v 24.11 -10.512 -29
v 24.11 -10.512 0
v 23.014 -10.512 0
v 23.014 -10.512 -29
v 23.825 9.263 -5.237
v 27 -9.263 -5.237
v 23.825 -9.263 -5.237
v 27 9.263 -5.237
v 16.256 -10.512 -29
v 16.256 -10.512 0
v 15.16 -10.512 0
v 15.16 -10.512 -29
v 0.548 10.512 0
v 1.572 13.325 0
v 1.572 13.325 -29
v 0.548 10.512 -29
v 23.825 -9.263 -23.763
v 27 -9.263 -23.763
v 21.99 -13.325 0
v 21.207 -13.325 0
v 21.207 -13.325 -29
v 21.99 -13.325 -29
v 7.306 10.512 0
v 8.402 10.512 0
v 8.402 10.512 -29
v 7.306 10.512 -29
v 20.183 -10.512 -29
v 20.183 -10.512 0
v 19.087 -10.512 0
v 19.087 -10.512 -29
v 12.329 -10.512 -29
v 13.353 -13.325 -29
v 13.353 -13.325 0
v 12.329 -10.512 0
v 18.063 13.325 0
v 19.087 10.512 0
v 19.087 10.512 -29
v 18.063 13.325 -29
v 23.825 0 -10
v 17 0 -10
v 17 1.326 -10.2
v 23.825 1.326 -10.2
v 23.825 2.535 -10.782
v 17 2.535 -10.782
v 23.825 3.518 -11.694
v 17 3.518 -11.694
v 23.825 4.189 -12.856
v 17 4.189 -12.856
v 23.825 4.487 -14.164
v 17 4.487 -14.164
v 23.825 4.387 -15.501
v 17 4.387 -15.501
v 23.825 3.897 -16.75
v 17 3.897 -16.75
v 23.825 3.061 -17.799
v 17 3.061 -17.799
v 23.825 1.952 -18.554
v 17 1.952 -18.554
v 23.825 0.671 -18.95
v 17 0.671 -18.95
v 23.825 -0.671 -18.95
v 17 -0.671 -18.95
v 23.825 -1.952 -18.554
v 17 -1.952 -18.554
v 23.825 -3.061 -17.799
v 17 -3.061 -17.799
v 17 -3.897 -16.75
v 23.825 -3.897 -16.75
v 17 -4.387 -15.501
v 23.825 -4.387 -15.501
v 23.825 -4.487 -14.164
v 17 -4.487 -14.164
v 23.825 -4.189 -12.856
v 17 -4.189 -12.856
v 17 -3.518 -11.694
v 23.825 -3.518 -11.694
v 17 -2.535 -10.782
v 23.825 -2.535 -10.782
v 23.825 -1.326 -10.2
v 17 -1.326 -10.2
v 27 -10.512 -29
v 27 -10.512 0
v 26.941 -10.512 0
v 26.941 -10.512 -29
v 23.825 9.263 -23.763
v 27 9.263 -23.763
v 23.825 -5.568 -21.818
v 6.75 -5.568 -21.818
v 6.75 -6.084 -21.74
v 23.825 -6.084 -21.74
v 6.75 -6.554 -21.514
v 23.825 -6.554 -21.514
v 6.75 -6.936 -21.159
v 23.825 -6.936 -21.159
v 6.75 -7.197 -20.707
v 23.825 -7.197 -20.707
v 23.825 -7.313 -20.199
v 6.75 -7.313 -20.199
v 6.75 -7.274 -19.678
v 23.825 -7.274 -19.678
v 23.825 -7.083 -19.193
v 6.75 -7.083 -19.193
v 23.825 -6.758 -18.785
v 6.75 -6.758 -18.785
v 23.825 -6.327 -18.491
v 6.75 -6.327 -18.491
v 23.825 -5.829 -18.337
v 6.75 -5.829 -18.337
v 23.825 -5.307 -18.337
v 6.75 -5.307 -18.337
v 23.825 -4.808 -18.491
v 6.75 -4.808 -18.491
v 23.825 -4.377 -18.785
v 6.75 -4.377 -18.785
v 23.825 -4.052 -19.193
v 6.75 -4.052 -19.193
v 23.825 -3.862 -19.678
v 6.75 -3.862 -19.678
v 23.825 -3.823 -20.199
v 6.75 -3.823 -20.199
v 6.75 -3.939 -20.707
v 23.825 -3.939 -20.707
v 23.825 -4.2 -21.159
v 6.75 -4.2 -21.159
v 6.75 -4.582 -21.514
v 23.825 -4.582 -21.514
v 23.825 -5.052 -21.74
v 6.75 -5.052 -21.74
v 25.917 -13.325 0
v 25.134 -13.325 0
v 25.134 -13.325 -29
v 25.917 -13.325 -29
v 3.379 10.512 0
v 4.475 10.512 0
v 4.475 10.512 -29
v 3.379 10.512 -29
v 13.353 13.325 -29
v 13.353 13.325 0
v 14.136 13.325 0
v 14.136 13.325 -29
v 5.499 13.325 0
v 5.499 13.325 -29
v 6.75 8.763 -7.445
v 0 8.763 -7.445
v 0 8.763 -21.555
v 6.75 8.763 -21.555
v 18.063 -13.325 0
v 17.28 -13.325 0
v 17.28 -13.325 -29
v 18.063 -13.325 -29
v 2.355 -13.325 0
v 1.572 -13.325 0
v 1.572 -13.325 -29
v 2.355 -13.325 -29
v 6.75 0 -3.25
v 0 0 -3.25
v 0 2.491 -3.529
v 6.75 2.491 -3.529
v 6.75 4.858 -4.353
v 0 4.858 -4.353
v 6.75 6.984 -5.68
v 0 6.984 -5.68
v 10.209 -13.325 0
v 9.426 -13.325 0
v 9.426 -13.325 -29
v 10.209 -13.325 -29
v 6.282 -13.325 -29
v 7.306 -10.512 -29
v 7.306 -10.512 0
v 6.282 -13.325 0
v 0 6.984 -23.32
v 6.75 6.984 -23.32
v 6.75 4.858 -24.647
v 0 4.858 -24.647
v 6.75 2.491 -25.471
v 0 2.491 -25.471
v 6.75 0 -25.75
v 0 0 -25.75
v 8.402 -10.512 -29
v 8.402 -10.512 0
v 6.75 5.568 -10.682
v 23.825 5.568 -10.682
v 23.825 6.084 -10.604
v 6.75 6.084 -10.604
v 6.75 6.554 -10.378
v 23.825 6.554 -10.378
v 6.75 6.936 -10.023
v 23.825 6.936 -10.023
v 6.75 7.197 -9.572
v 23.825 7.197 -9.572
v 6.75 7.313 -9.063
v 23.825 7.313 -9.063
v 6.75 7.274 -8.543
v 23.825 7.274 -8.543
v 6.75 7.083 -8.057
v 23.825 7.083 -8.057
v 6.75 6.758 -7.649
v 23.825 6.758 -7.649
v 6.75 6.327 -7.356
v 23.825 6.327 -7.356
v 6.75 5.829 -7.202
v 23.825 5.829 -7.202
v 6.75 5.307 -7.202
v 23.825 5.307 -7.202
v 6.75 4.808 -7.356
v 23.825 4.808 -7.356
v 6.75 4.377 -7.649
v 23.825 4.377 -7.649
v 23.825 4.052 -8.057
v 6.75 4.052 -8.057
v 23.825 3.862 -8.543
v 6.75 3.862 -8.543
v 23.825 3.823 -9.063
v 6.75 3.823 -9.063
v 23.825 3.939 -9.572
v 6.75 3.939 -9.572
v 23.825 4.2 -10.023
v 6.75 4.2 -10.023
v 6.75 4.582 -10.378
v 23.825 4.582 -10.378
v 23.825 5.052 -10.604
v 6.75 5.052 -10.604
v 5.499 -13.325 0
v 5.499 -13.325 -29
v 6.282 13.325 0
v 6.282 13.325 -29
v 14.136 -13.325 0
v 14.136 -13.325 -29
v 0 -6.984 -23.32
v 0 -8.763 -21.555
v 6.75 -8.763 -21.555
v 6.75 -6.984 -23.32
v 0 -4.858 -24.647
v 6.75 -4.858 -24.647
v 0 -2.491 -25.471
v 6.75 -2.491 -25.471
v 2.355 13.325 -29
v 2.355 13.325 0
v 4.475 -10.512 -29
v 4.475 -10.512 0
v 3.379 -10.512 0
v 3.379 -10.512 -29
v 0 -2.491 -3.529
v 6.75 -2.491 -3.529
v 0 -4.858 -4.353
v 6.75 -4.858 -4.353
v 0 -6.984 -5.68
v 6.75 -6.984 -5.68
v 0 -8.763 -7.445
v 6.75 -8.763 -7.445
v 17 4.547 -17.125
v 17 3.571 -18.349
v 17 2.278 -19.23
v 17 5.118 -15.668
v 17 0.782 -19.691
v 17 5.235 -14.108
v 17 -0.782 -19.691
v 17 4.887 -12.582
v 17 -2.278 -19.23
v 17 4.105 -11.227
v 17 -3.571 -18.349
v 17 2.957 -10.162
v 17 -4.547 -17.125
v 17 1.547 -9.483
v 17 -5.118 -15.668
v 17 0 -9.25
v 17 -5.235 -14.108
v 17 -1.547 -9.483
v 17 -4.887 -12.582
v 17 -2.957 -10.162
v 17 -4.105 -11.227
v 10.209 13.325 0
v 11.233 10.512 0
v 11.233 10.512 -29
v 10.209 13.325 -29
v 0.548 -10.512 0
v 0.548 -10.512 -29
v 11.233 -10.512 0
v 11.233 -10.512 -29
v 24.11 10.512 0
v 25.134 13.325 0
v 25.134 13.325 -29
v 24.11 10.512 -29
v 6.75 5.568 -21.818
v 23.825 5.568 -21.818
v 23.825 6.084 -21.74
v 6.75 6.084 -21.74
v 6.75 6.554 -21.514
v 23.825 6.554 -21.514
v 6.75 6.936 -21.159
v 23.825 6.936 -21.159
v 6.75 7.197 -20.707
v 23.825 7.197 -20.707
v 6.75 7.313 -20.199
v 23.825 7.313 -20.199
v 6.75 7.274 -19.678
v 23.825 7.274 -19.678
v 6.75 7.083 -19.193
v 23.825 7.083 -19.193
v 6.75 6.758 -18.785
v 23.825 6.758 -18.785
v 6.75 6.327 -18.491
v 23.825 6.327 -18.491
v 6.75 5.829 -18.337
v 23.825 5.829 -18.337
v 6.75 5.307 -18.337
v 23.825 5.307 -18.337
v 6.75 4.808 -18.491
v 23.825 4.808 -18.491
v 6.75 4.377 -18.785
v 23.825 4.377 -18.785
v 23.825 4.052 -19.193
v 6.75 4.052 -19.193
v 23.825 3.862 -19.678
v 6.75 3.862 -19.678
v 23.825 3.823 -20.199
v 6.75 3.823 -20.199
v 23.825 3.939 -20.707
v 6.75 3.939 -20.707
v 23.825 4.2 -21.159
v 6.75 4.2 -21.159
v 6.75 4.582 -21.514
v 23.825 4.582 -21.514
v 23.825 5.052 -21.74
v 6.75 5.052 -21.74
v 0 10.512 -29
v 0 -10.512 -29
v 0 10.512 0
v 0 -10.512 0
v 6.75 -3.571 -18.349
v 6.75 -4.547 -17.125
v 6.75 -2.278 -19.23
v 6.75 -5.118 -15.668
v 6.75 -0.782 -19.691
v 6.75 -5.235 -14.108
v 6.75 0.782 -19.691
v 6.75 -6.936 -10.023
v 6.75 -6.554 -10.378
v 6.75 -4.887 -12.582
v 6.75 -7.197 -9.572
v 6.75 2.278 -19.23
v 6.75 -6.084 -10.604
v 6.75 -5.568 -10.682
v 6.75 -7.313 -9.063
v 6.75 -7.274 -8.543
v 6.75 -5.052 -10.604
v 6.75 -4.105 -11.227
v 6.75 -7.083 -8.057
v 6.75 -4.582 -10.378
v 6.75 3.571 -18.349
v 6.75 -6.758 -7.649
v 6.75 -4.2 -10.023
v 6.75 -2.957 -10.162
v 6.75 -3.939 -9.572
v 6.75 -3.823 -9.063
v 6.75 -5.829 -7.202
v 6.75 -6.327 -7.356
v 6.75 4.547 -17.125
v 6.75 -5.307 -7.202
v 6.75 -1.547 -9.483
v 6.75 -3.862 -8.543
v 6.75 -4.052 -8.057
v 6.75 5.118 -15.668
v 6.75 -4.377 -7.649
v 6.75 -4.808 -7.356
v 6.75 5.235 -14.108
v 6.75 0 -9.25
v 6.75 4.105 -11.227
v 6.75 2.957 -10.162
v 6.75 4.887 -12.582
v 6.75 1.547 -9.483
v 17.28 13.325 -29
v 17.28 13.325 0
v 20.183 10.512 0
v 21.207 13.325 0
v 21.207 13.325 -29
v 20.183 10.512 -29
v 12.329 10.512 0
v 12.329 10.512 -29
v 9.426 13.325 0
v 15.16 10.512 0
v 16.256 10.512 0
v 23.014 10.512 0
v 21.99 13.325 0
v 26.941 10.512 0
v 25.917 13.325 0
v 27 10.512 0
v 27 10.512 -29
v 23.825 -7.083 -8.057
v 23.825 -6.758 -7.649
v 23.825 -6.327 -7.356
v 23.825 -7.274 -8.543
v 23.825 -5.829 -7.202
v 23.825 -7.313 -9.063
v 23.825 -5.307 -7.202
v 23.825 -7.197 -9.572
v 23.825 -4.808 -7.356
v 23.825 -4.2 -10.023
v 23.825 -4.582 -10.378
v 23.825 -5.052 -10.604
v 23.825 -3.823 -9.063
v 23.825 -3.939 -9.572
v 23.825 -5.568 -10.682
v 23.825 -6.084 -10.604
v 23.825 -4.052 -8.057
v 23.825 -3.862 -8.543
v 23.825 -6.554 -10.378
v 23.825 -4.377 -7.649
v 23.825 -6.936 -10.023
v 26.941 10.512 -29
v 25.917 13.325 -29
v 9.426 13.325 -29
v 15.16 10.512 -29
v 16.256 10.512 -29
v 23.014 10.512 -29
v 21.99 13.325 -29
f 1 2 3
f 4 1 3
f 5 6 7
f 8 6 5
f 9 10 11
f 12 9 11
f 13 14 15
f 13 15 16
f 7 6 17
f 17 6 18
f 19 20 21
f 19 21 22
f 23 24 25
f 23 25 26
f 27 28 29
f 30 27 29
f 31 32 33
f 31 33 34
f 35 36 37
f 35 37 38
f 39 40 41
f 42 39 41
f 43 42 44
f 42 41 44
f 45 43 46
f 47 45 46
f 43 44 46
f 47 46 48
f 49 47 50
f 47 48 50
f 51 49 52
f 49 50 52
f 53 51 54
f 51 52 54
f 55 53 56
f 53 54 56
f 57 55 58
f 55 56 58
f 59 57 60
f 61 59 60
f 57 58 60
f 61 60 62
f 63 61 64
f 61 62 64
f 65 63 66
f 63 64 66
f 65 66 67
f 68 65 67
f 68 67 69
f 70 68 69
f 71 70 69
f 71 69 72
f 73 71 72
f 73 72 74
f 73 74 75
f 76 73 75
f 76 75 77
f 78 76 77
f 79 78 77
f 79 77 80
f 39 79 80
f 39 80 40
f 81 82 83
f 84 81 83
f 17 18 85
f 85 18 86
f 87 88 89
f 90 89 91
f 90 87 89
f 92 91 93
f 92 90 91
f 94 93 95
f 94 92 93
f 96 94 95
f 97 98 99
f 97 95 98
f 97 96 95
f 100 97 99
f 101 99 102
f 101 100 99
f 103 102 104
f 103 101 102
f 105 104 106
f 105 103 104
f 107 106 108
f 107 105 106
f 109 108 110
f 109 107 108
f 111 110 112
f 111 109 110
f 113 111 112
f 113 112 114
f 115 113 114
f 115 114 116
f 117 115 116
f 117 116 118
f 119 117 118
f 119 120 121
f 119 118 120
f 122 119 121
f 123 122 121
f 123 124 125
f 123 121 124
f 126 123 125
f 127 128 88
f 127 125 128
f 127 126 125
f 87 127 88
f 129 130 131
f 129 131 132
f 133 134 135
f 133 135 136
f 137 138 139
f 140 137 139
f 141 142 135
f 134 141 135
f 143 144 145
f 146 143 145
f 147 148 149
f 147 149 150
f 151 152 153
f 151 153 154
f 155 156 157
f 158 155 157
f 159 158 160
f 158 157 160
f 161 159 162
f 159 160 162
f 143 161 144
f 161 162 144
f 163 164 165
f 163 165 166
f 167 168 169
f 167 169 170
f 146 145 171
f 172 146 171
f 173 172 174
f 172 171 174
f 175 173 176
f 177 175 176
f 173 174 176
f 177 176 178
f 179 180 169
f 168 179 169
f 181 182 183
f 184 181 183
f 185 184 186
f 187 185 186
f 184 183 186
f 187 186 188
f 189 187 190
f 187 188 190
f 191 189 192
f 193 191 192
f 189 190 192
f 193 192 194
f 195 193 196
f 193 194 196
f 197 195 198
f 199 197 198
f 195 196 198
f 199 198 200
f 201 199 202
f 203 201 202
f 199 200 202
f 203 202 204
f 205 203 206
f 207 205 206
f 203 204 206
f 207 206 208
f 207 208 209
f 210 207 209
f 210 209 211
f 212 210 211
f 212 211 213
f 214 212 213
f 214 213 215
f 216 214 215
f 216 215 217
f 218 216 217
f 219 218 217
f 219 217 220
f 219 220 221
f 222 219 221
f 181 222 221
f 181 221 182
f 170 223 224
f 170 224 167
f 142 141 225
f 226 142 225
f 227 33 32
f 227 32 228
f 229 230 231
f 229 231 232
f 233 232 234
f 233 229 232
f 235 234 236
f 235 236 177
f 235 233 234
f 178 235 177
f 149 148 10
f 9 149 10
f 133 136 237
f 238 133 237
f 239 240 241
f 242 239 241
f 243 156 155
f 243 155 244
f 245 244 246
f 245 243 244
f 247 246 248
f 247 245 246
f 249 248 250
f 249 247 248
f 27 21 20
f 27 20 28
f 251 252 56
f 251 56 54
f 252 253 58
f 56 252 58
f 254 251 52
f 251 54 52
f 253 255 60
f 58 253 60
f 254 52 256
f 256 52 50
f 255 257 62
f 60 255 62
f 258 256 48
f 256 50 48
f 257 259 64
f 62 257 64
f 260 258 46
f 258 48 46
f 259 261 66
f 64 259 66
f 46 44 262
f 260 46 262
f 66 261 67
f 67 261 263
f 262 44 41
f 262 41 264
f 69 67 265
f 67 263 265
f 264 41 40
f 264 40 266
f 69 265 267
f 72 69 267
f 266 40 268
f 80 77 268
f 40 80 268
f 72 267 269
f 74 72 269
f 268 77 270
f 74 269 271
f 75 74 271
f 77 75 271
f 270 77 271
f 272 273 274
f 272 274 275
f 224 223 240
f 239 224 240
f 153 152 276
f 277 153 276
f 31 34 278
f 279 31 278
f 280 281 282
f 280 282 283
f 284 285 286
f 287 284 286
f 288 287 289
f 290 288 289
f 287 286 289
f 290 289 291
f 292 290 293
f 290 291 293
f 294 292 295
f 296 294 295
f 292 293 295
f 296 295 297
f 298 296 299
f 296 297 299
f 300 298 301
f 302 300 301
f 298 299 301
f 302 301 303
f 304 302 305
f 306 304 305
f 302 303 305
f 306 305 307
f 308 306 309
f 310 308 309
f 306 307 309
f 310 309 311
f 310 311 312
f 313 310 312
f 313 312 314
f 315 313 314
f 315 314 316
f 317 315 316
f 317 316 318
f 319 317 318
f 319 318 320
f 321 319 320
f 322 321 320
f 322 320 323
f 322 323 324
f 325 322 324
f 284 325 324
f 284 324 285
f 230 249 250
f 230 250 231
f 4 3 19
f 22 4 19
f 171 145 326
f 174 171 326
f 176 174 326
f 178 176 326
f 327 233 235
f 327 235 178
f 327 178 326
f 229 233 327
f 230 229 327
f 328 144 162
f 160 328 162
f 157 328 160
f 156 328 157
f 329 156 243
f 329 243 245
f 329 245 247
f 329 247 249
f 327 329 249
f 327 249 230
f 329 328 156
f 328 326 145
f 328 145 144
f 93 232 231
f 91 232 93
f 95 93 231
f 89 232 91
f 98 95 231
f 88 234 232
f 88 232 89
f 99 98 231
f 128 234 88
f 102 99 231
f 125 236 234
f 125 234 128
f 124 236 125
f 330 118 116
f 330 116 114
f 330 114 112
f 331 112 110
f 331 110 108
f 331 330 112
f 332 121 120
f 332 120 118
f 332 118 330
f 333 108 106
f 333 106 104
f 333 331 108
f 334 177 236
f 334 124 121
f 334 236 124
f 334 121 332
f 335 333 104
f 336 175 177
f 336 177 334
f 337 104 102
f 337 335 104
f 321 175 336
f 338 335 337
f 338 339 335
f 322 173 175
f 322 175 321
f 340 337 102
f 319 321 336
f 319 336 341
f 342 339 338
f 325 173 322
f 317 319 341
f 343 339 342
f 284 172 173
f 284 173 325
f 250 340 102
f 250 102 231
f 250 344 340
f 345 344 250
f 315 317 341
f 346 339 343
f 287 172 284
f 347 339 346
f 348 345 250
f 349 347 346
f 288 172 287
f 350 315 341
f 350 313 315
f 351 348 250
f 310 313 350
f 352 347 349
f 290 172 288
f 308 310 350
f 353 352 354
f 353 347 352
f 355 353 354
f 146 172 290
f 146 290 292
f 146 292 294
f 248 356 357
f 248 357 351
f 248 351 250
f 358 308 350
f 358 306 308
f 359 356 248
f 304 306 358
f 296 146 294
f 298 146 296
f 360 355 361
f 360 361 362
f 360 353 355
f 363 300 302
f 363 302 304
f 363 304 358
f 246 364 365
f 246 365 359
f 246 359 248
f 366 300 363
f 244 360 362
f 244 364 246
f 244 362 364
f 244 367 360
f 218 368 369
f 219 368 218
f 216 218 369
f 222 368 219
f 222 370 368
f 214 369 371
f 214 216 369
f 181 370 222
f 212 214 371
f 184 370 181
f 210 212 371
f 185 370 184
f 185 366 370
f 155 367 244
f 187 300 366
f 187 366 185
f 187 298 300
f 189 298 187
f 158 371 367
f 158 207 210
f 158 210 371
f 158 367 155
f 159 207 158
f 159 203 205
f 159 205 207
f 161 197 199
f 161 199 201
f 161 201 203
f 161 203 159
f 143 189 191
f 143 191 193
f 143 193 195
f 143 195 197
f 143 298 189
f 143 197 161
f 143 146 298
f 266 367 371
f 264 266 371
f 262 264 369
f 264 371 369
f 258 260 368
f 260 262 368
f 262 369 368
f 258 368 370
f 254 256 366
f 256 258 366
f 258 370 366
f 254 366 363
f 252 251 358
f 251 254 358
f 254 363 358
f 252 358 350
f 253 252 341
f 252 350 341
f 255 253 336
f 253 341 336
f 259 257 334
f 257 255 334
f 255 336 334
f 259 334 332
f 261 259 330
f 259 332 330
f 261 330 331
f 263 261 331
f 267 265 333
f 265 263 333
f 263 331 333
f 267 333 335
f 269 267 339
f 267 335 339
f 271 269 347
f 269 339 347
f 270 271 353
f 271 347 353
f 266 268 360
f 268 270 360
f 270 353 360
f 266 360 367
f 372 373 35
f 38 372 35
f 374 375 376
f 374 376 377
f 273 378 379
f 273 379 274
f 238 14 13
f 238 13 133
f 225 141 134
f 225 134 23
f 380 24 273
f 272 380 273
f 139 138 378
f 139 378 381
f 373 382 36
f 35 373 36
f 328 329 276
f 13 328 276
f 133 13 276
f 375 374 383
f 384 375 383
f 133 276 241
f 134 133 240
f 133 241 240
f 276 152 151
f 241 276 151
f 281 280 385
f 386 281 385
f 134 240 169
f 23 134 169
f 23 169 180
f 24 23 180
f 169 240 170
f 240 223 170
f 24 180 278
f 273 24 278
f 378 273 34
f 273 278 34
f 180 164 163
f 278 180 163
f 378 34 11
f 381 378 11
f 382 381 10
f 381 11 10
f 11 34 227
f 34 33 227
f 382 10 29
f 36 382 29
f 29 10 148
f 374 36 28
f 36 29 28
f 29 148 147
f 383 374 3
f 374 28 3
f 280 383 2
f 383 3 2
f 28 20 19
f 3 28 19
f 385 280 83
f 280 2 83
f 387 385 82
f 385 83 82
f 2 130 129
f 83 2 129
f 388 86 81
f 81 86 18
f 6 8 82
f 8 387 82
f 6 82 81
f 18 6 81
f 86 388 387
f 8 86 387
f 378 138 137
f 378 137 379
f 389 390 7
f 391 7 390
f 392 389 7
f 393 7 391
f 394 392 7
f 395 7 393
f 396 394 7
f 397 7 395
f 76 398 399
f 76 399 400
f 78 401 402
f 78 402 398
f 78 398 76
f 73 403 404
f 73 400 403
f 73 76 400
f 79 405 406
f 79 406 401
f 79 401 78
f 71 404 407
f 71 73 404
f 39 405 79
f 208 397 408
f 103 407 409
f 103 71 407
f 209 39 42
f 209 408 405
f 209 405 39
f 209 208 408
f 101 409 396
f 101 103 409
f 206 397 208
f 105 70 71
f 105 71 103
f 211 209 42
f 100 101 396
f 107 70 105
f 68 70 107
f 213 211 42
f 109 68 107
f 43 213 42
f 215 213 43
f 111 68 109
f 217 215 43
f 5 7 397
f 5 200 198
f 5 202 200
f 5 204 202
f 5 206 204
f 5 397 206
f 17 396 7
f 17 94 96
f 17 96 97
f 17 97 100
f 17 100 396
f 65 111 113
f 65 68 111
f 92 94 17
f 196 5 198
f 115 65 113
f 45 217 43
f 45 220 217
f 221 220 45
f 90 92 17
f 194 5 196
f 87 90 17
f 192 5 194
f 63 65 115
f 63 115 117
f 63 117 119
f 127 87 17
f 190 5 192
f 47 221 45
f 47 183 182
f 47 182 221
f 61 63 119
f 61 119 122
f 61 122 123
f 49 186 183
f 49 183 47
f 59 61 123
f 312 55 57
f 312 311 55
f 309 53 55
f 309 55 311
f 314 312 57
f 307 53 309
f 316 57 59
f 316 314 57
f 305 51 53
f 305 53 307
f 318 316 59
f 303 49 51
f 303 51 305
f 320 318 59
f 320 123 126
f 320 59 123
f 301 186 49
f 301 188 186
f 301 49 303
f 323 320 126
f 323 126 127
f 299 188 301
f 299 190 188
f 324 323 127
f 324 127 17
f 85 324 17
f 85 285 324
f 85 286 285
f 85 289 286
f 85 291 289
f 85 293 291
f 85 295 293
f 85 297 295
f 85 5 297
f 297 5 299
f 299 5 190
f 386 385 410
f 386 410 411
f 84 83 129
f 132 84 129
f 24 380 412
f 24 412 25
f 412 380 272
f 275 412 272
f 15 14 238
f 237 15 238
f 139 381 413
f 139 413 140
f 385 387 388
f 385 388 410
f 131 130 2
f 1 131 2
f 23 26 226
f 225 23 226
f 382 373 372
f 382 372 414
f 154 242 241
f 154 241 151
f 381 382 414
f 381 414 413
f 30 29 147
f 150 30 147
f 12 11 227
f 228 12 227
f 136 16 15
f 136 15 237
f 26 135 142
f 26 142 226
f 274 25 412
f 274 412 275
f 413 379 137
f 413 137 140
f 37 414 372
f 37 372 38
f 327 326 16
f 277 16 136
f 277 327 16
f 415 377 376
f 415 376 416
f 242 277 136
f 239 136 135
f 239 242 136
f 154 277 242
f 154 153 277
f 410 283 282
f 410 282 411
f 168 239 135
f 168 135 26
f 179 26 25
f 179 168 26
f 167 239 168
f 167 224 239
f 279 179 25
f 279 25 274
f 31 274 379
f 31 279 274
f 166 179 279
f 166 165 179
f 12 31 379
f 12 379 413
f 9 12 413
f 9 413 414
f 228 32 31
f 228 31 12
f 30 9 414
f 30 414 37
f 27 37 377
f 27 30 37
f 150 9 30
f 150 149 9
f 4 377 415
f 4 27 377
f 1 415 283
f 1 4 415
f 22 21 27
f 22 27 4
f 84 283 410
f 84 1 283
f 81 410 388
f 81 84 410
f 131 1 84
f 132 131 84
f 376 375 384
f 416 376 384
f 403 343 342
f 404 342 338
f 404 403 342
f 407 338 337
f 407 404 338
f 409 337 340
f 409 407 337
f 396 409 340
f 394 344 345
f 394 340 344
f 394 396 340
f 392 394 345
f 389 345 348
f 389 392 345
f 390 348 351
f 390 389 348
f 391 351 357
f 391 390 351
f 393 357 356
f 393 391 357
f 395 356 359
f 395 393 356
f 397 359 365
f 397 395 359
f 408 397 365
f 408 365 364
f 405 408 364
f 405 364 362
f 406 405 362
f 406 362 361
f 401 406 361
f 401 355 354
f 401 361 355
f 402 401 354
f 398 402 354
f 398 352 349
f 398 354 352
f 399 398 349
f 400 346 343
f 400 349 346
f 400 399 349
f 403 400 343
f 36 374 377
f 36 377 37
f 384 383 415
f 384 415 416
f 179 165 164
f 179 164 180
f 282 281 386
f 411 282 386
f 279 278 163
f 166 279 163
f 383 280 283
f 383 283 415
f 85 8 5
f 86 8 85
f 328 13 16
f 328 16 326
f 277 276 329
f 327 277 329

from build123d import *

# Parameters (mm, degrees)
BLANKSKE_W           = 27
BLANKSKE_H           = 13.325
BLANK_DEPTH          = 29
TOOTHCUTSIM_DEPTH    = 42.803775248
TEETHCUTS_COUNT      = 8
TEETHCUTS_PITCH      = 3.926990813
CUT_EXTRUDE1_DEPTH   = 6.75
SKETCH3_R            = 5.25
CUT_EXTRUDE2_DEPTH   = 10.25
SKETCH4_R            = 4.5
CUT_EXTRUDE3_DEPTH   = 37.16013862
SKETCH5_R            = 2.5
CUT_EXTRUDE4_DEPTH   = 3.175
SKETCH6_R            = 1.75
CUT_EXTRUDE5_DEPTH   = 40.826953813
MIRROR1_COPY_1_DEPTH = 42.803775248
MIRROR1_COPY_2_DEPTH = 42.803775248
MIRROR1_COPY_3_DEPTH = 42.803775248
MIRROR1_COPY_4_DEPTH = 42.803775248
MIRROR1_COPY_5_DEPTH = 42.803775248
MIRROR1_COPY_6_DEPTH = 42.803775248
MIRROR1_COPY_7_DEPTH = 42.803775248
SKETCH9_W            = 18.526
SKETCH9_H            = 18.526
CUT_EXTRUDE6_DEPTH   = 3.175


with BuildPart() as part:
    # BlankSke → Blank (new body)
    with BuildSketch(Plane.XY):
        with Locations((13.5, 6.6625)):
            Rectangle(BLANKSKE_W, BLANKSKE_H)
    blank = extrude(amount=-BLANK_DEPTH)

    # TooCutSkeSim → ToothCutSim (cut, through all)
    with BuildSketch(Plane.XY):
        Polygon((0.548044212, 10.5125), (-0.548044212, 10.5125), (-1.58095534, 13.3504), (1.58095534, 13.3504), align=None)
    toothcutsim = extrude(amount=-TOOTHCUTSIM_DEPTH, mode=Mode.SUBTRACT)

    # TeethCuts: ToothCutSim ×8
    with Locations(*[(i * TEETHCUTS_PITCH, 0, 0) for i in range(1, TEETHCUTS_COUNT)]):
        add(toothcutsim, mode=Mode.SUBTRACT)

    # Sketch2 → Cut-Extrude1 (cut)
    with BuildSketch(Plane.ZY):
        with BuildLine():
            Line((-7.445049185, 8.763), (-21.554950815, 8.763))
            ThreePointArc((-21.554950815, 8.763), (-24.647184256, 4.857689952), (-25.75, 0))
            Line((-25.75, 0), (-3.25, 0))
            ThreePointArc((-3.25, 0), (-4.352815744, 4.857689952), (-7.445049185, 8.763))
        make_face()
    cut_extrude1 = extrude(amount=-CUT_EXTRUDE1_DEPTH, mode=Mode.SUBTRACT)

    # Sketch3 → Cut-Extrude2 (cut)
    with BuildSketch(Plane.ZY.offset(-6.75)):
        with Locations((-14.5, 0)):
            Circle(SKETCH3_R)
    cut_extrude2 = extrude(amount=-CUT_EXTRUDE2_DEPTH, mode=Mode.SUBTRACT)

    # Sketch4 → Cut-Extrude3 (cut, symmetric)
    with BuildSketch(Plane.ZY.offset(-17)):
        with Locations((-14.5, 0)):
            Circle(SKETCH4_R)
    cut_extrude3 = extrude(amount=CUT_EXTRUDE3_DEPTH, both=True, mode=Mode.SUBTRACT)

    # Sketch5 → Cut-Extrude4 (cut)
    with BuildSketch(Plane(origin=(27, 0, 0), x_dir=(0, 0, -1), z_dir=(1, 0, 0))):
        with Locations((8.932241205, 5.567758795)):
            Circle(SKETCH5_R)
        with Locations((20.067758795, 5.567758795)):
            Circle(SKETCH5_R)
    cut_extrude4 = extrude(amount=-CUT_EXTRUDE4_DEPTH, mode=Mode.SUBTRACT)

    # Sketch6 → Cut-Extrude5 (cut, through all)
    with BuildSketch(Plane(origin=(23.825, 0, 0), x_dir=(0, 0, -1), z_dir=(1, 0, 0))):
        with Locations((20.067758795, 5.567758795)):
            Circle(SKETCH6_R)
        with Locations((8.932241205, 5.567758795)):
            Circle(SKETCH6_R)
    cut_extrude5 = extrude(amount=-CUT_EXTRUDE5_DEPTH, mode=Mode.SUBTRACT)

    # Mirror1: Blank, ToothCutSim, Cut-Extrude1, Cut-Extrude2, Cut-Extrude3, Cut-Extrude4, Cut-Extrude5 across plane
    add(blank.mirror(Plane(origin=(0, 0, -29), x_dir=(0, 0, 1), z_dir=(0, -1, 0))))
    add(toothcutsim.mirror(Plane(origin=(0, 0, -29), x_dir=(0, 0, 1), z_dir=(0, -1, 0))), mode=Mode.SUBTRACT)
    add(cut_extrude1.mirror(Plane(origin=(0, 0, -29), x_dir=(0, 0, 1), z_dir=(0, -1, 0))), mode=Mode.SUBTRACT)
    add(cut_extrude2.mirror(Plane(origin=(0, 0, -29), x_dir=(0, 0, 1), z_dir=(0, -1, 0))), mode=Mode.SUBTRACT)
    add(cut_extrude3.mirror(Plane(origin=(0, 0, -29), x_dir=(0, 0, 1), z_dir=(0, -1, 0))), mode=Mode.SUBTRACT)
    add(cut_extrude4.mirror(Plane(origin=(0, 0, -29), x_dir=(0, 0, 1), z_dir=(0, -1, 0))), mode=Mode.SUBTRACT)
    add(cut_extrude5.mirror(Plane(origin=(0, 0, -29), x_dir=(0, 0, 1), z_dir=(0, -1, 0))), mode=Mode.SUBTRACT)

    # Mirror1 copy 1 sketch → Mirror1 copy 1 (cut, through all)
    with BuildSketch(Plane(origin=(3.926990813, 0, 0), x_dir=(1, 0, 0), z_dir=(0, 0, 1))):
        Polygon((0.548044212, -10.5125), (-0.548044212, -10.5125), (-1.58095534, -13.3504), (1.58095534, -13.3504), align=None)
    extrude(amount=-MIRROR1_COPY_1_DEPTH, mode=Mode.SUBTRACT)

    # Mirror1 copy 2 sketch → Mirror1 copy 2 (cut, through all)
    with BuildSketch(Plane(origin=(7.853981625, 0, 0), x_dir=(1, 0, 0), z_dir=(0, 0, 1))):
        Polygon((0.548044212, -10.5125), (-0.548044212, -10.5125), (-1.58095534, -13.3504), (1.58095534, -13.3504), align=None)
    extrude(amount=-MIRROR1_COPY_2_DEPTH, mode=Mode.SUBTRACT)

    # Mirror1 copy 3 sketch → Mirror1 copy 3 (cut, through all)
    with BuildSketch(Plane(origin=(11.780972438, 0, 0), x_dir=(1, 0, 0), z_dir=(0, 0, 1))):
        Polygon((0.548044212, -10.5125), (-0.548044212, -10.5125), (-1.58095534, -13.3504), (1.58095534, -13.3504), align=None)
    extrude(amount=-MIRROR1_COPY_3_DEPTH, mode=Mode.SUBTRACT)

    # Mirror1 copy 4 sketch → Mirror1 copy 4 (cut, through all)
    with BuildSketch(Plane(origin=(15.70796325, 0, 0), x_dir=(1, 0, 0), z_dir=(0, 0, 1))):
        Polygon((0.548044212, -10.5125), (-0.548044212, -10.5125), (-1.58095534, -13.3504), (1.58095534, -13.3504), align=None)
    extrude(amount=-MIRROR1_COPY_4_DEPTH, mode=Mode.SUBTRACT)

    # Mirror1 copy 5 sketch → Mirror1 copy 5 (cut, through all)
    with BuildSketch(Plane(origin=(19.634954063, 0, 0), x_dir=(1, 0, 0), z_dir=(0, 0, 1))):
        Polygon((0.548044212, -10.5125), (-0.548044212, -10.5125), (-1.58095534, -13.3504), (1.58095534, -13.3504), align=None)
    extrude(amount=-MIRROR1_COPY_5_DEPTH, mode=Mode.SUBTRACT)

    # Mirror1 copy 6 sketch → Mirror1 copy 6 (cut, through all)
    with BuildSketch(Plane(origin=(23.561944875, 0, 0), x_dir=(1, 0, 0), z_dir=(0, 0, 1))):
        Polygon((0.548044212, -10.5125), (-0.548044212, -10.5125), (-1.58095534, -13.3504), (1.58095534, -13.3504), align=None)
    extrude(amount=-MIRROR1_COPY_6_DEPTH, mode=Mode.SUBTRACT)

    # Mirror1 copy 7 sketch → Mirror1 copy 7 (cut, through all)
    with BuildSketch(Plane(origin=(27.488935688, 0, 0), x_dir=(1, 0, 0), z_dir=(0, 0, 1))):
        Polygon((0.548044212, -10.5125), (-0.548044212, -10.5125), (-1.58095534, -13.3504), (1.58095534, -13.3504), align=None)
    extrude(amount=-MIRROR1_COPY_7_DEPTH, mode=Mode.SUBTRACT)

    # Sketch9 → Cut-Extrude6 (cut)
    with BuildSketch(Plane(origin=(27, 0, 0), x_dir=(0, 0, -1), z_dir=(1, 0, 0))):
        with Locations((14.5, 0)):
            Rectangle(SKETCH9_W, SKETCH9_H)
    extrude(amount=-CUT_EXTRUDE6_DEPTH, mode=Mode.SUBTRACT)


solid = part.part
